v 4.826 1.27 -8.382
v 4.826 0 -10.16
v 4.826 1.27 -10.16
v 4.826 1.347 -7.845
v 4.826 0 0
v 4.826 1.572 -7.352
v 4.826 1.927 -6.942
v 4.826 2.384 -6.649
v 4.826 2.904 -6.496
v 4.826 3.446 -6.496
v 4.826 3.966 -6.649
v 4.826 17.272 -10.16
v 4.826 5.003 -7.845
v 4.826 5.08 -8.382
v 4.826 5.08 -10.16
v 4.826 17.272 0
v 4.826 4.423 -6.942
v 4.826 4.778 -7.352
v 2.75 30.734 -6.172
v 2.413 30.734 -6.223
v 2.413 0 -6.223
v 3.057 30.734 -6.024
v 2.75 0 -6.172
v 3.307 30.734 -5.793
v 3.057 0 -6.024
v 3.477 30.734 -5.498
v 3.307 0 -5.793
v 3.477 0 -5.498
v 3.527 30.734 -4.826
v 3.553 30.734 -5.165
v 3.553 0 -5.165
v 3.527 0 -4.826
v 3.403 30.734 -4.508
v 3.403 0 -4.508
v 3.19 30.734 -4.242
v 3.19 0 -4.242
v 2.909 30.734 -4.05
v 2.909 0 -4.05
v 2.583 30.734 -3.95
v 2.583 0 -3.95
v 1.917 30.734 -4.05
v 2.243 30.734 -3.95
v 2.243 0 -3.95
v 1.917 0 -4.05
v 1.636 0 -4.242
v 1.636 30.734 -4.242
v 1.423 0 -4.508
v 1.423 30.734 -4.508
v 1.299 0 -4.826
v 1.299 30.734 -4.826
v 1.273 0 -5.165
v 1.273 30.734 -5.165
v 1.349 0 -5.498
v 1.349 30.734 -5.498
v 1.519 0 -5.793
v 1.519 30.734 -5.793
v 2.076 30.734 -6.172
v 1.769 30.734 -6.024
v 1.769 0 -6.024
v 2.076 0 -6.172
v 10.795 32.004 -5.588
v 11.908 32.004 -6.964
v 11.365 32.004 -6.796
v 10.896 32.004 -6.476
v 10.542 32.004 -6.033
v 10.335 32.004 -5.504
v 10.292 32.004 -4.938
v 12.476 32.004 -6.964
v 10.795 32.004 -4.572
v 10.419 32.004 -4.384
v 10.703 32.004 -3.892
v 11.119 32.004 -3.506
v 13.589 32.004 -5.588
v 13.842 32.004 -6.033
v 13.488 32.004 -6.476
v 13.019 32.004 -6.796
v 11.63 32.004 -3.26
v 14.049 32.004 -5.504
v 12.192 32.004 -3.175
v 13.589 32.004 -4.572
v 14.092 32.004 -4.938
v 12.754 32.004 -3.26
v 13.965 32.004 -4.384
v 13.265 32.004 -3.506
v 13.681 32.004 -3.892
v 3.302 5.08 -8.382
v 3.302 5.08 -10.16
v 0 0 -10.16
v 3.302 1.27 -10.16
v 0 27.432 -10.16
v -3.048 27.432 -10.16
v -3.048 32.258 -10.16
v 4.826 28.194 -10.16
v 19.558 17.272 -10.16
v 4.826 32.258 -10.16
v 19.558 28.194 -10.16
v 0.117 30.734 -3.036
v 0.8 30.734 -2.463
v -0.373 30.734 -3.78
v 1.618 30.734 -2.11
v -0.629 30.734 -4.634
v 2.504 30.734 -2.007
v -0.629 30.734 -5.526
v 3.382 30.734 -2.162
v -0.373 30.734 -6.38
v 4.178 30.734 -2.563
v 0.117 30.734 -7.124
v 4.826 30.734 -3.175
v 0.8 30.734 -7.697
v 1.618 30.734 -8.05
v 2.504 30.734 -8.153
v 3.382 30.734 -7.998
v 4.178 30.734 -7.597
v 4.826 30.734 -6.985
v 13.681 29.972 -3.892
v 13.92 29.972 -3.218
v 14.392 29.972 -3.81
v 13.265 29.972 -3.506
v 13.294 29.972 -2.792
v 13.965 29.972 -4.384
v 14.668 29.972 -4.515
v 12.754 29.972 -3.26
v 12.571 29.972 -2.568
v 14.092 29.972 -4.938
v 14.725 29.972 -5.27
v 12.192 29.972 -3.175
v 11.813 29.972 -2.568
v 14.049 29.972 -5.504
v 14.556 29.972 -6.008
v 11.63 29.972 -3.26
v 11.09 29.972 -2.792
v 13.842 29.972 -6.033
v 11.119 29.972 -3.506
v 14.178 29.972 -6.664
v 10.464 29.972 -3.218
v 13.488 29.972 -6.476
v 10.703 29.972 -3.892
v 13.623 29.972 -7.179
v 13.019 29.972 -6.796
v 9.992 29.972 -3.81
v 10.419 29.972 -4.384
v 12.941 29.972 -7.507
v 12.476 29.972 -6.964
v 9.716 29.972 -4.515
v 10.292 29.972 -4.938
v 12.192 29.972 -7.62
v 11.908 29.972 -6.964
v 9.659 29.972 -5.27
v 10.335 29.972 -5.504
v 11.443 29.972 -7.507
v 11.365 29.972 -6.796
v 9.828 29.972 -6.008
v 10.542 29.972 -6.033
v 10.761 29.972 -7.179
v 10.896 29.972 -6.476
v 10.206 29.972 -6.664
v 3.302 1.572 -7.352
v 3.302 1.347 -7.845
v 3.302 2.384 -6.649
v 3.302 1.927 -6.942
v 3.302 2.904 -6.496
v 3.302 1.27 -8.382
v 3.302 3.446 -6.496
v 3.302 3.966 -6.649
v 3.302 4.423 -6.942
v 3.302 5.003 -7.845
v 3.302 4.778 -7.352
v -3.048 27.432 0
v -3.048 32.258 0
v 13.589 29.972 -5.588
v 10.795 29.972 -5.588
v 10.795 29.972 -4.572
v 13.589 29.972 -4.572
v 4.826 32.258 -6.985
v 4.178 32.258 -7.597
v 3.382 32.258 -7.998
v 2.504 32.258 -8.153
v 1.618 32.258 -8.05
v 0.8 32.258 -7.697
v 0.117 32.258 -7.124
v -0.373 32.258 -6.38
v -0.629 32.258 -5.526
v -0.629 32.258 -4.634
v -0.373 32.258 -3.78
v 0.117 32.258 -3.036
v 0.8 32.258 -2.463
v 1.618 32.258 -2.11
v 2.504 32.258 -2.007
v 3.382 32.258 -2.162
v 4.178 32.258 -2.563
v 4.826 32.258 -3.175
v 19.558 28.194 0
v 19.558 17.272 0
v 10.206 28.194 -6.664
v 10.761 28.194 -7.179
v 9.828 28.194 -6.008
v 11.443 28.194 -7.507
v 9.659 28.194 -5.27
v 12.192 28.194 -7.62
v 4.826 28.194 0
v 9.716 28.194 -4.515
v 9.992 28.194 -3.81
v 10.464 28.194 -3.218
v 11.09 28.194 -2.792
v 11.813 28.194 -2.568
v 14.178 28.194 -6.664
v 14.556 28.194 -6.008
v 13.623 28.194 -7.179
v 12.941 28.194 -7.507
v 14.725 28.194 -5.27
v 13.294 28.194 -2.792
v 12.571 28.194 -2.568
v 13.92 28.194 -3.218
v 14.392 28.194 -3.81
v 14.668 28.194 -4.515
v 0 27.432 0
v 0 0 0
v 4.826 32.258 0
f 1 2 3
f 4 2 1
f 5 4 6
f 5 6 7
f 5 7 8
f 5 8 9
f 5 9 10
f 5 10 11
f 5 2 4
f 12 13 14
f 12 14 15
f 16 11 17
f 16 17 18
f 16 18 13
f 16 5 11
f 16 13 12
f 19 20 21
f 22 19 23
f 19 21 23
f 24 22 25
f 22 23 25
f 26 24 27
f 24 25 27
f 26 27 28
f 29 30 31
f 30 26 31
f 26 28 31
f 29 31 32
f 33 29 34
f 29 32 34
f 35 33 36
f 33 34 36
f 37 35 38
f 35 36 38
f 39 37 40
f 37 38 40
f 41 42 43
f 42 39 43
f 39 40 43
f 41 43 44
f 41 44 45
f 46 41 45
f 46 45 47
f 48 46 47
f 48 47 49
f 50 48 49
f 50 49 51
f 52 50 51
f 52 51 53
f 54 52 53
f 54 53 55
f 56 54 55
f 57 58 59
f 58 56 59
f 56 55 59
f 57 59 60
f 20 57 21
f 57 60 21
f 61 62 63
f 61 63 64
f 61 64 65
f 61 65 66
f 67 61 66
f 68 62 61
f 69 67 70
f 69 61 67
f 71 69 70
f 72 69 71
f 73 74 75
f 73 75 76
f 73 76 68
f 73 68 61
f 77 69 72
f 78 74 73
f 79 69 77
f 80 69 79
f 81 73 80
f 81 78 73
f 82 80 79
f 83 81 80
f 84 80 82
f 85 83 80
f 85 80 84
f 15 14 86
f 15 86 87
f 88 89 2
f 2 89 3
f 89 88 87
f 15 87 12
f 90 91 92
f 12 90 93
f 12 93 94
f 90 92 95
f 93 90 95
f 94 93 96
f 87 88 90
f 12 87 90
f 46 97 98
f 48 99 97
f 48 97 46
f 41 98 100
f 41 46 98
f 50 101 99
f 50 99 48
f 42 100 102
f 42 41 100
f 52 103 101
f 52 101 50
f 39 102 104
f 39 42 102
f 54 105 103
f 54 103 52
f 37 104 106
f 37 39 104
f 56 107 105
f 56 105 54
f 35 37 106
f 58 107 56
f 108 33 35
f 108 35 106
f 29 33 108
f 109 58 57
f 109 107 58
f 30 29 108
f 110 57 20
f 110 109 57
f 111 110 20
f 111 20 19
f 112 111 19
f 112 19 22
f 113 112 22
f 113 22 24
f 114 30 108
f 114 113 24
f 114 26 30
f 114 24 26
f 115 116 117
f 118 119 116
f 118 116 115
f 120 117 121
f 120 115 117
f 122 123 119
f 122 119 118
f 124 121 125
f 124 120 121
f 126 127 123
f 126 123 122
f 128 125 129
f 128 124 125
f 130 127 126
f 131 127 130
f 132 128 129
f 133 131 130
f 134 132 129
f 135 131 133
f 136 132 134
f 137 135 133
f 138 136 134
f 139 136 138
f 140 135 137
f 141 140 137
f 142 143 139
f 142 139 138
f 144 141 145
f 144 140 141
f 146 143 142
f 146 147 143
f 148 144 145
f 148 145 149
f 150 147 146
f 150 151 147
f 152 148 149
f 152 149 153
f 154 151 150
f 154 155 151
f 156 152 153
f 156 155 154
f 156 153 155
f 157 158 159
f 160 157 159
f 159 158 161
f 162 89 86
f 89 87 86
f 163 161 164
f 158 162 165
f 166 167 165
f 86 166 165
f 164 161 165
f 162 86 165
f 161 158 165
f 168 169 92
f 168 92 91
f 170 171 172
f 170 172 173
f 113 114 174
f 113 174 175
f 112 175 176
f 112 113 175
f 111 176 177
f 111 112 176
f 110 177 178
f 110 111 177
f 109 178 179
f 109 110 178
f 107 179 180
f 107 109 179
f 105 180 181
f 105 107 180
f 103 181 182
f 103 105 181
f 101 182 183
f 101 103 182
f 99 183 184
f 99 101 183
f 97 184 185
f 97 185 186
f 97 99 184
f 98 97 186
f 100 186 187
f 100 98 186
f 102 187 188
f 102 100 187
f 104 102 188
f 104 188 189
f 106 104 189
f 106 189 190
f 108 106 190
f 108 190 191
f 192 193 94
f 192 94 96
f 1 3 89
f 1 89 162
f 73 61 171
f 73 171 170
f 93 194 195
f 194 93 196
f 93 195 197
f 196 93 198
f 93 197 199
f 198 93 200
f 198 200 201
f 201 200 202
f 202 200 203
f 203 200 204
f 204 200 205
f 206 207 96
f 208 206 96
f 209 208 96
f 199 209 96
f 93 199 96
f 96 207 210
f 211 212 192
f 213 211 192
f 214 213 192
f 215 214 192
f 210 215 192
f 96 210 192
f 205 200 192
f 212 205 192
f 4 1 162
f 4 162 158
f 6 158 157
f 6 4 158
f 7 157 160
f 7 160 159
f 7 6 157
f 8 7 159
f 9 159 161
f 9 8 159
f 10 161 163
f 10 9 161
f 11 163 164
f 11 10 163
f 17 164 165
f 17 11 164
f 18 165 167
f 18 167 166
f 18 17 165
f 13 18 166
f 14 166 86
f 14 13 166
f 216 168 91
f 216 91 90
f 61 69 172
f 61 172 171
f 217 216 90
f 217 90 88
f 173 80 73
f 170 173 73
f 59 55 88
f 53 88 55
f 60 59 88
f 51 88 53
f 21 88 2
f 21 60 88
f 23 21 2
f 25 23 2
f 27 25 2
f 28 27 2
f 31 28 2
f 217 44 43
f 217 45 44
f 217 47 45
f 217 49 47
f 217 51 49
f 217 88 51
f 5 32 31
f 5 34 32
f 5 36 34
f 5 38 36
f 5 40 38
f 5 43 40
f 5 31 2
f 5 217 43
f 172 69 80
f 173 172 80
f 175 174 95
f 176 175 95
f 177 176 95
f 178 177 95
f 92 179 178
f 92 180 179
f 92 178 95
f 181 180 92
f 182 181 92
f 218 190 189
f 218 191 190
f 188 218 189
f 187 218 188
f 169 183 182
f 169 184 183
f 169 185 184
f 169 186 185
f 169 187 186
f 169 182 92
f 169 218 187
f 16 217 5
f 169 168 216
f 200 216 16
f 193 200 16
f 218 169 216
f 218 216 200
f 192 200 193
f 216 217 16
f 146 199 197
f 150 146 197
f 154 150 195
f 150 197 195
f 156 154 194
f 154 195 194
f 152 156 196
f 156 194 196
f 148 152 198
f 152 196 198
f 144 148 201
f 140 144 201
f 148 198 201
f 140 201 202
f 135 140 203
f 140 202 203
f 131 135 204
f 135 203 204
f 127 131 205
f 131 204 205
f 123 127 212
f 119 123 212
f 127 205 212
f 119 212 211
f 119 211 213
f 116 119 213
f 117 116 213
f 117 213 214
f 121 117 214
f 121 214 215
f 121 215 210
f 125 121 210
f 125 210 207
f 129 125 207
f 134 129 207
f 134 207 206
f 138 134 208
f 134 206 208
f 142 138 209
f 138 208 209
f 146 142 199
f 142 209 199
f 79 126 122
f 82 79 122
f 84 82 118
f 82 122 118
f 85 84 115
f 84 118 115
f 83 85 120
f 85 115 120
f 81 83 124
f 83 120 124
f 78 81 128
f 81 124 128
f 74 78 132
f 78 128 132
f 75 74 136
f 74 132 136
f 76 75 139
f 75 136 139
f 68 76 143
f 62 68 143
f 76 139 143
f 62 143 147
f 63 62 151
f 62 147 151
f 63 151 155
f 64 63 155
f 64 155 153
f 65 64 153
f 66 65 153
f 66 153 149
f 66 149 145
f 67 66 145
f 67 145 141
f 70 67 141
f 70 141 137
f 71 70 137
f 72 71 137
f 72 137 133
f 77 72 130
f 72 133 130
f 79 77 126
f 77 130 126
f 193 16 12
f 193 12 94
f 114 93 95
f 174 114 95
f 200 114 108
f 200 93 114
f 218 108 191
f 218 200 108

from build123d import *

# Parameters (mm, degrees)
SKETCH1_W           = 14.732
SKETCH1_H           = 10.922
BOSS_EXTRUDE1_DEPTH = 10.16
SKETCH2_R           = 1.143
CUT_EXTRUDE1_DEPTH  = 40.068139551
CUT_EXTRUDE2_DEPTH  = 1.524
CUT_EXTRUDE5_START  = -1.524
SKETCH5_R           = 1.143
CUT_EXTRUDE5_DEPTH  = 1.524
SKETCH6_R           = 2.54
BOSS_EXTRUDE2_DEPTH = 1.778
SKETCH7_R           = 1.905
BOSS_EXTRUDE3_DEPTH = 2.032
SKETCH9_W           = 2.794
SKETCH9_H           = 1.016
CUT_EXTRUDE6_DEPTH  = 2.032


with BuildPart() as part:
    # Sketch1 → Boss-Extrude1 (new body)
    with BuildSketch(Plane.XY):
        with Locations((12.192, 22.733)):
            Rectangle(SKETCH1_W, SKETCH1_H)
        Polygon((-3.048, 27.432), (0, 27.432), (0, 0), (4.826, 0), (4.826, 32.258), (-3.048, 32.258), align=None)
    extrude(amount=-BOSS_EXTRUDE1_DEPTH)

    # Sketch2 → Cut-Extrude1 (cut, through all)
    with BuildSketch(Plane(origin=(0, 0, 0), x_dir=(-1, 0, 0), z_dir=(0, -1, 0))):
        with Locations(Location((-2.413, 5.08, 0), (0, 0, 90))):
            Circle(SKETCH2_R)
    extrude(amount=-CUT_EXTRUDE1_DEPTH, mode=Mode.SUBTRACT)

    # Sketch3 → Cut-Extrude2 (cut)
    with BuildSketch(Plane(origin=(4.826, 0, 0), x_dir=(0, 0, -1), z_dir=(1, 0, 0))):
        with BuildLine():
            Line((10.16, 1.27), (8.382, 1.27))
            ThreePointArc((8.382, 1.27), (6.477, 3.175), (8.382, 5.08))
            Line((8.382, 5.08), (10.16, 5.08))
            Line((10.16, 5.08), (10.16, 1.27))
        make_face()
    extrude(amount=-CUT_EXTRUDE2_DEPTH, mode=Mode.SUBTRACT)

    # Sketch5 → Cut-Extrude5 (cut)
    with BuildSketch(Plane(origin=(0, 32.258, 0), x_dir=(1, 0, 0), z_dir=(0, 1, 0)).offset(CUT_EXTRUDE5_START)):
        with BuildLine():
            Line((4.826, 3.175), (4.826, 5.08))
            Line((4.826, 5.08), (4.826, 6.985))
            ThreePointArc((4.826, 6.985), (-0.661344483, 5.08), (4.826, 3.175))
        make_face()
        with Locations(Location((2.413, 5.08, 0), (0, 0, 90))):
            Circle(SKETCH5_R, mode=Mode.SUBTRACT)
    extrude(amount=CUT_EXTRUDE5_DEPTH, mode=Mode.SUBTRACT)

    # Sketch6 → Boss-Extrude2 (add)
    with BuildSketch(Plane(origin=(0, 28.194, 0), x_dir=(1, 0, 0), z_dir=(0, 1, 0))):
        with Locations(Location((12.192, 5.08, 0), (0, 0, 90))):
            Circle(SKETCH6_R)
    extrude(amount=BOSS_EXTRUDE2_DEPTH)

    # Sketch7 → Boss-Extrude3 (add)
    with BuildSketch(Plane(origin=(0, 29.972, 0), x_dir=(1, 0, 0), z_dir=(0, 1, 0))):
        with Locations(Location((12.192, 5.08, 0), (0, 0, 270))):
            Circle(SKETCH7_R)
    extrude(amount=BOSS_EXTRUDE3_DEPTH)

    # Sketch9 → Cut-Extrude6 (cut)
    with BuildSketch(Plane(origin=(0, 32.004, 0), x_dir=(1, 0, 0), z_dir=(0, 1, 0))):
        with Locations((12.192, 5.08)):
            Rectangle(SKETCH9_W, SKETCH9_H)
    extrude(amount=-CUT_EXTRUDE6_DEPTH, mode=Mode.SUBTRACT)


solid = part.part
